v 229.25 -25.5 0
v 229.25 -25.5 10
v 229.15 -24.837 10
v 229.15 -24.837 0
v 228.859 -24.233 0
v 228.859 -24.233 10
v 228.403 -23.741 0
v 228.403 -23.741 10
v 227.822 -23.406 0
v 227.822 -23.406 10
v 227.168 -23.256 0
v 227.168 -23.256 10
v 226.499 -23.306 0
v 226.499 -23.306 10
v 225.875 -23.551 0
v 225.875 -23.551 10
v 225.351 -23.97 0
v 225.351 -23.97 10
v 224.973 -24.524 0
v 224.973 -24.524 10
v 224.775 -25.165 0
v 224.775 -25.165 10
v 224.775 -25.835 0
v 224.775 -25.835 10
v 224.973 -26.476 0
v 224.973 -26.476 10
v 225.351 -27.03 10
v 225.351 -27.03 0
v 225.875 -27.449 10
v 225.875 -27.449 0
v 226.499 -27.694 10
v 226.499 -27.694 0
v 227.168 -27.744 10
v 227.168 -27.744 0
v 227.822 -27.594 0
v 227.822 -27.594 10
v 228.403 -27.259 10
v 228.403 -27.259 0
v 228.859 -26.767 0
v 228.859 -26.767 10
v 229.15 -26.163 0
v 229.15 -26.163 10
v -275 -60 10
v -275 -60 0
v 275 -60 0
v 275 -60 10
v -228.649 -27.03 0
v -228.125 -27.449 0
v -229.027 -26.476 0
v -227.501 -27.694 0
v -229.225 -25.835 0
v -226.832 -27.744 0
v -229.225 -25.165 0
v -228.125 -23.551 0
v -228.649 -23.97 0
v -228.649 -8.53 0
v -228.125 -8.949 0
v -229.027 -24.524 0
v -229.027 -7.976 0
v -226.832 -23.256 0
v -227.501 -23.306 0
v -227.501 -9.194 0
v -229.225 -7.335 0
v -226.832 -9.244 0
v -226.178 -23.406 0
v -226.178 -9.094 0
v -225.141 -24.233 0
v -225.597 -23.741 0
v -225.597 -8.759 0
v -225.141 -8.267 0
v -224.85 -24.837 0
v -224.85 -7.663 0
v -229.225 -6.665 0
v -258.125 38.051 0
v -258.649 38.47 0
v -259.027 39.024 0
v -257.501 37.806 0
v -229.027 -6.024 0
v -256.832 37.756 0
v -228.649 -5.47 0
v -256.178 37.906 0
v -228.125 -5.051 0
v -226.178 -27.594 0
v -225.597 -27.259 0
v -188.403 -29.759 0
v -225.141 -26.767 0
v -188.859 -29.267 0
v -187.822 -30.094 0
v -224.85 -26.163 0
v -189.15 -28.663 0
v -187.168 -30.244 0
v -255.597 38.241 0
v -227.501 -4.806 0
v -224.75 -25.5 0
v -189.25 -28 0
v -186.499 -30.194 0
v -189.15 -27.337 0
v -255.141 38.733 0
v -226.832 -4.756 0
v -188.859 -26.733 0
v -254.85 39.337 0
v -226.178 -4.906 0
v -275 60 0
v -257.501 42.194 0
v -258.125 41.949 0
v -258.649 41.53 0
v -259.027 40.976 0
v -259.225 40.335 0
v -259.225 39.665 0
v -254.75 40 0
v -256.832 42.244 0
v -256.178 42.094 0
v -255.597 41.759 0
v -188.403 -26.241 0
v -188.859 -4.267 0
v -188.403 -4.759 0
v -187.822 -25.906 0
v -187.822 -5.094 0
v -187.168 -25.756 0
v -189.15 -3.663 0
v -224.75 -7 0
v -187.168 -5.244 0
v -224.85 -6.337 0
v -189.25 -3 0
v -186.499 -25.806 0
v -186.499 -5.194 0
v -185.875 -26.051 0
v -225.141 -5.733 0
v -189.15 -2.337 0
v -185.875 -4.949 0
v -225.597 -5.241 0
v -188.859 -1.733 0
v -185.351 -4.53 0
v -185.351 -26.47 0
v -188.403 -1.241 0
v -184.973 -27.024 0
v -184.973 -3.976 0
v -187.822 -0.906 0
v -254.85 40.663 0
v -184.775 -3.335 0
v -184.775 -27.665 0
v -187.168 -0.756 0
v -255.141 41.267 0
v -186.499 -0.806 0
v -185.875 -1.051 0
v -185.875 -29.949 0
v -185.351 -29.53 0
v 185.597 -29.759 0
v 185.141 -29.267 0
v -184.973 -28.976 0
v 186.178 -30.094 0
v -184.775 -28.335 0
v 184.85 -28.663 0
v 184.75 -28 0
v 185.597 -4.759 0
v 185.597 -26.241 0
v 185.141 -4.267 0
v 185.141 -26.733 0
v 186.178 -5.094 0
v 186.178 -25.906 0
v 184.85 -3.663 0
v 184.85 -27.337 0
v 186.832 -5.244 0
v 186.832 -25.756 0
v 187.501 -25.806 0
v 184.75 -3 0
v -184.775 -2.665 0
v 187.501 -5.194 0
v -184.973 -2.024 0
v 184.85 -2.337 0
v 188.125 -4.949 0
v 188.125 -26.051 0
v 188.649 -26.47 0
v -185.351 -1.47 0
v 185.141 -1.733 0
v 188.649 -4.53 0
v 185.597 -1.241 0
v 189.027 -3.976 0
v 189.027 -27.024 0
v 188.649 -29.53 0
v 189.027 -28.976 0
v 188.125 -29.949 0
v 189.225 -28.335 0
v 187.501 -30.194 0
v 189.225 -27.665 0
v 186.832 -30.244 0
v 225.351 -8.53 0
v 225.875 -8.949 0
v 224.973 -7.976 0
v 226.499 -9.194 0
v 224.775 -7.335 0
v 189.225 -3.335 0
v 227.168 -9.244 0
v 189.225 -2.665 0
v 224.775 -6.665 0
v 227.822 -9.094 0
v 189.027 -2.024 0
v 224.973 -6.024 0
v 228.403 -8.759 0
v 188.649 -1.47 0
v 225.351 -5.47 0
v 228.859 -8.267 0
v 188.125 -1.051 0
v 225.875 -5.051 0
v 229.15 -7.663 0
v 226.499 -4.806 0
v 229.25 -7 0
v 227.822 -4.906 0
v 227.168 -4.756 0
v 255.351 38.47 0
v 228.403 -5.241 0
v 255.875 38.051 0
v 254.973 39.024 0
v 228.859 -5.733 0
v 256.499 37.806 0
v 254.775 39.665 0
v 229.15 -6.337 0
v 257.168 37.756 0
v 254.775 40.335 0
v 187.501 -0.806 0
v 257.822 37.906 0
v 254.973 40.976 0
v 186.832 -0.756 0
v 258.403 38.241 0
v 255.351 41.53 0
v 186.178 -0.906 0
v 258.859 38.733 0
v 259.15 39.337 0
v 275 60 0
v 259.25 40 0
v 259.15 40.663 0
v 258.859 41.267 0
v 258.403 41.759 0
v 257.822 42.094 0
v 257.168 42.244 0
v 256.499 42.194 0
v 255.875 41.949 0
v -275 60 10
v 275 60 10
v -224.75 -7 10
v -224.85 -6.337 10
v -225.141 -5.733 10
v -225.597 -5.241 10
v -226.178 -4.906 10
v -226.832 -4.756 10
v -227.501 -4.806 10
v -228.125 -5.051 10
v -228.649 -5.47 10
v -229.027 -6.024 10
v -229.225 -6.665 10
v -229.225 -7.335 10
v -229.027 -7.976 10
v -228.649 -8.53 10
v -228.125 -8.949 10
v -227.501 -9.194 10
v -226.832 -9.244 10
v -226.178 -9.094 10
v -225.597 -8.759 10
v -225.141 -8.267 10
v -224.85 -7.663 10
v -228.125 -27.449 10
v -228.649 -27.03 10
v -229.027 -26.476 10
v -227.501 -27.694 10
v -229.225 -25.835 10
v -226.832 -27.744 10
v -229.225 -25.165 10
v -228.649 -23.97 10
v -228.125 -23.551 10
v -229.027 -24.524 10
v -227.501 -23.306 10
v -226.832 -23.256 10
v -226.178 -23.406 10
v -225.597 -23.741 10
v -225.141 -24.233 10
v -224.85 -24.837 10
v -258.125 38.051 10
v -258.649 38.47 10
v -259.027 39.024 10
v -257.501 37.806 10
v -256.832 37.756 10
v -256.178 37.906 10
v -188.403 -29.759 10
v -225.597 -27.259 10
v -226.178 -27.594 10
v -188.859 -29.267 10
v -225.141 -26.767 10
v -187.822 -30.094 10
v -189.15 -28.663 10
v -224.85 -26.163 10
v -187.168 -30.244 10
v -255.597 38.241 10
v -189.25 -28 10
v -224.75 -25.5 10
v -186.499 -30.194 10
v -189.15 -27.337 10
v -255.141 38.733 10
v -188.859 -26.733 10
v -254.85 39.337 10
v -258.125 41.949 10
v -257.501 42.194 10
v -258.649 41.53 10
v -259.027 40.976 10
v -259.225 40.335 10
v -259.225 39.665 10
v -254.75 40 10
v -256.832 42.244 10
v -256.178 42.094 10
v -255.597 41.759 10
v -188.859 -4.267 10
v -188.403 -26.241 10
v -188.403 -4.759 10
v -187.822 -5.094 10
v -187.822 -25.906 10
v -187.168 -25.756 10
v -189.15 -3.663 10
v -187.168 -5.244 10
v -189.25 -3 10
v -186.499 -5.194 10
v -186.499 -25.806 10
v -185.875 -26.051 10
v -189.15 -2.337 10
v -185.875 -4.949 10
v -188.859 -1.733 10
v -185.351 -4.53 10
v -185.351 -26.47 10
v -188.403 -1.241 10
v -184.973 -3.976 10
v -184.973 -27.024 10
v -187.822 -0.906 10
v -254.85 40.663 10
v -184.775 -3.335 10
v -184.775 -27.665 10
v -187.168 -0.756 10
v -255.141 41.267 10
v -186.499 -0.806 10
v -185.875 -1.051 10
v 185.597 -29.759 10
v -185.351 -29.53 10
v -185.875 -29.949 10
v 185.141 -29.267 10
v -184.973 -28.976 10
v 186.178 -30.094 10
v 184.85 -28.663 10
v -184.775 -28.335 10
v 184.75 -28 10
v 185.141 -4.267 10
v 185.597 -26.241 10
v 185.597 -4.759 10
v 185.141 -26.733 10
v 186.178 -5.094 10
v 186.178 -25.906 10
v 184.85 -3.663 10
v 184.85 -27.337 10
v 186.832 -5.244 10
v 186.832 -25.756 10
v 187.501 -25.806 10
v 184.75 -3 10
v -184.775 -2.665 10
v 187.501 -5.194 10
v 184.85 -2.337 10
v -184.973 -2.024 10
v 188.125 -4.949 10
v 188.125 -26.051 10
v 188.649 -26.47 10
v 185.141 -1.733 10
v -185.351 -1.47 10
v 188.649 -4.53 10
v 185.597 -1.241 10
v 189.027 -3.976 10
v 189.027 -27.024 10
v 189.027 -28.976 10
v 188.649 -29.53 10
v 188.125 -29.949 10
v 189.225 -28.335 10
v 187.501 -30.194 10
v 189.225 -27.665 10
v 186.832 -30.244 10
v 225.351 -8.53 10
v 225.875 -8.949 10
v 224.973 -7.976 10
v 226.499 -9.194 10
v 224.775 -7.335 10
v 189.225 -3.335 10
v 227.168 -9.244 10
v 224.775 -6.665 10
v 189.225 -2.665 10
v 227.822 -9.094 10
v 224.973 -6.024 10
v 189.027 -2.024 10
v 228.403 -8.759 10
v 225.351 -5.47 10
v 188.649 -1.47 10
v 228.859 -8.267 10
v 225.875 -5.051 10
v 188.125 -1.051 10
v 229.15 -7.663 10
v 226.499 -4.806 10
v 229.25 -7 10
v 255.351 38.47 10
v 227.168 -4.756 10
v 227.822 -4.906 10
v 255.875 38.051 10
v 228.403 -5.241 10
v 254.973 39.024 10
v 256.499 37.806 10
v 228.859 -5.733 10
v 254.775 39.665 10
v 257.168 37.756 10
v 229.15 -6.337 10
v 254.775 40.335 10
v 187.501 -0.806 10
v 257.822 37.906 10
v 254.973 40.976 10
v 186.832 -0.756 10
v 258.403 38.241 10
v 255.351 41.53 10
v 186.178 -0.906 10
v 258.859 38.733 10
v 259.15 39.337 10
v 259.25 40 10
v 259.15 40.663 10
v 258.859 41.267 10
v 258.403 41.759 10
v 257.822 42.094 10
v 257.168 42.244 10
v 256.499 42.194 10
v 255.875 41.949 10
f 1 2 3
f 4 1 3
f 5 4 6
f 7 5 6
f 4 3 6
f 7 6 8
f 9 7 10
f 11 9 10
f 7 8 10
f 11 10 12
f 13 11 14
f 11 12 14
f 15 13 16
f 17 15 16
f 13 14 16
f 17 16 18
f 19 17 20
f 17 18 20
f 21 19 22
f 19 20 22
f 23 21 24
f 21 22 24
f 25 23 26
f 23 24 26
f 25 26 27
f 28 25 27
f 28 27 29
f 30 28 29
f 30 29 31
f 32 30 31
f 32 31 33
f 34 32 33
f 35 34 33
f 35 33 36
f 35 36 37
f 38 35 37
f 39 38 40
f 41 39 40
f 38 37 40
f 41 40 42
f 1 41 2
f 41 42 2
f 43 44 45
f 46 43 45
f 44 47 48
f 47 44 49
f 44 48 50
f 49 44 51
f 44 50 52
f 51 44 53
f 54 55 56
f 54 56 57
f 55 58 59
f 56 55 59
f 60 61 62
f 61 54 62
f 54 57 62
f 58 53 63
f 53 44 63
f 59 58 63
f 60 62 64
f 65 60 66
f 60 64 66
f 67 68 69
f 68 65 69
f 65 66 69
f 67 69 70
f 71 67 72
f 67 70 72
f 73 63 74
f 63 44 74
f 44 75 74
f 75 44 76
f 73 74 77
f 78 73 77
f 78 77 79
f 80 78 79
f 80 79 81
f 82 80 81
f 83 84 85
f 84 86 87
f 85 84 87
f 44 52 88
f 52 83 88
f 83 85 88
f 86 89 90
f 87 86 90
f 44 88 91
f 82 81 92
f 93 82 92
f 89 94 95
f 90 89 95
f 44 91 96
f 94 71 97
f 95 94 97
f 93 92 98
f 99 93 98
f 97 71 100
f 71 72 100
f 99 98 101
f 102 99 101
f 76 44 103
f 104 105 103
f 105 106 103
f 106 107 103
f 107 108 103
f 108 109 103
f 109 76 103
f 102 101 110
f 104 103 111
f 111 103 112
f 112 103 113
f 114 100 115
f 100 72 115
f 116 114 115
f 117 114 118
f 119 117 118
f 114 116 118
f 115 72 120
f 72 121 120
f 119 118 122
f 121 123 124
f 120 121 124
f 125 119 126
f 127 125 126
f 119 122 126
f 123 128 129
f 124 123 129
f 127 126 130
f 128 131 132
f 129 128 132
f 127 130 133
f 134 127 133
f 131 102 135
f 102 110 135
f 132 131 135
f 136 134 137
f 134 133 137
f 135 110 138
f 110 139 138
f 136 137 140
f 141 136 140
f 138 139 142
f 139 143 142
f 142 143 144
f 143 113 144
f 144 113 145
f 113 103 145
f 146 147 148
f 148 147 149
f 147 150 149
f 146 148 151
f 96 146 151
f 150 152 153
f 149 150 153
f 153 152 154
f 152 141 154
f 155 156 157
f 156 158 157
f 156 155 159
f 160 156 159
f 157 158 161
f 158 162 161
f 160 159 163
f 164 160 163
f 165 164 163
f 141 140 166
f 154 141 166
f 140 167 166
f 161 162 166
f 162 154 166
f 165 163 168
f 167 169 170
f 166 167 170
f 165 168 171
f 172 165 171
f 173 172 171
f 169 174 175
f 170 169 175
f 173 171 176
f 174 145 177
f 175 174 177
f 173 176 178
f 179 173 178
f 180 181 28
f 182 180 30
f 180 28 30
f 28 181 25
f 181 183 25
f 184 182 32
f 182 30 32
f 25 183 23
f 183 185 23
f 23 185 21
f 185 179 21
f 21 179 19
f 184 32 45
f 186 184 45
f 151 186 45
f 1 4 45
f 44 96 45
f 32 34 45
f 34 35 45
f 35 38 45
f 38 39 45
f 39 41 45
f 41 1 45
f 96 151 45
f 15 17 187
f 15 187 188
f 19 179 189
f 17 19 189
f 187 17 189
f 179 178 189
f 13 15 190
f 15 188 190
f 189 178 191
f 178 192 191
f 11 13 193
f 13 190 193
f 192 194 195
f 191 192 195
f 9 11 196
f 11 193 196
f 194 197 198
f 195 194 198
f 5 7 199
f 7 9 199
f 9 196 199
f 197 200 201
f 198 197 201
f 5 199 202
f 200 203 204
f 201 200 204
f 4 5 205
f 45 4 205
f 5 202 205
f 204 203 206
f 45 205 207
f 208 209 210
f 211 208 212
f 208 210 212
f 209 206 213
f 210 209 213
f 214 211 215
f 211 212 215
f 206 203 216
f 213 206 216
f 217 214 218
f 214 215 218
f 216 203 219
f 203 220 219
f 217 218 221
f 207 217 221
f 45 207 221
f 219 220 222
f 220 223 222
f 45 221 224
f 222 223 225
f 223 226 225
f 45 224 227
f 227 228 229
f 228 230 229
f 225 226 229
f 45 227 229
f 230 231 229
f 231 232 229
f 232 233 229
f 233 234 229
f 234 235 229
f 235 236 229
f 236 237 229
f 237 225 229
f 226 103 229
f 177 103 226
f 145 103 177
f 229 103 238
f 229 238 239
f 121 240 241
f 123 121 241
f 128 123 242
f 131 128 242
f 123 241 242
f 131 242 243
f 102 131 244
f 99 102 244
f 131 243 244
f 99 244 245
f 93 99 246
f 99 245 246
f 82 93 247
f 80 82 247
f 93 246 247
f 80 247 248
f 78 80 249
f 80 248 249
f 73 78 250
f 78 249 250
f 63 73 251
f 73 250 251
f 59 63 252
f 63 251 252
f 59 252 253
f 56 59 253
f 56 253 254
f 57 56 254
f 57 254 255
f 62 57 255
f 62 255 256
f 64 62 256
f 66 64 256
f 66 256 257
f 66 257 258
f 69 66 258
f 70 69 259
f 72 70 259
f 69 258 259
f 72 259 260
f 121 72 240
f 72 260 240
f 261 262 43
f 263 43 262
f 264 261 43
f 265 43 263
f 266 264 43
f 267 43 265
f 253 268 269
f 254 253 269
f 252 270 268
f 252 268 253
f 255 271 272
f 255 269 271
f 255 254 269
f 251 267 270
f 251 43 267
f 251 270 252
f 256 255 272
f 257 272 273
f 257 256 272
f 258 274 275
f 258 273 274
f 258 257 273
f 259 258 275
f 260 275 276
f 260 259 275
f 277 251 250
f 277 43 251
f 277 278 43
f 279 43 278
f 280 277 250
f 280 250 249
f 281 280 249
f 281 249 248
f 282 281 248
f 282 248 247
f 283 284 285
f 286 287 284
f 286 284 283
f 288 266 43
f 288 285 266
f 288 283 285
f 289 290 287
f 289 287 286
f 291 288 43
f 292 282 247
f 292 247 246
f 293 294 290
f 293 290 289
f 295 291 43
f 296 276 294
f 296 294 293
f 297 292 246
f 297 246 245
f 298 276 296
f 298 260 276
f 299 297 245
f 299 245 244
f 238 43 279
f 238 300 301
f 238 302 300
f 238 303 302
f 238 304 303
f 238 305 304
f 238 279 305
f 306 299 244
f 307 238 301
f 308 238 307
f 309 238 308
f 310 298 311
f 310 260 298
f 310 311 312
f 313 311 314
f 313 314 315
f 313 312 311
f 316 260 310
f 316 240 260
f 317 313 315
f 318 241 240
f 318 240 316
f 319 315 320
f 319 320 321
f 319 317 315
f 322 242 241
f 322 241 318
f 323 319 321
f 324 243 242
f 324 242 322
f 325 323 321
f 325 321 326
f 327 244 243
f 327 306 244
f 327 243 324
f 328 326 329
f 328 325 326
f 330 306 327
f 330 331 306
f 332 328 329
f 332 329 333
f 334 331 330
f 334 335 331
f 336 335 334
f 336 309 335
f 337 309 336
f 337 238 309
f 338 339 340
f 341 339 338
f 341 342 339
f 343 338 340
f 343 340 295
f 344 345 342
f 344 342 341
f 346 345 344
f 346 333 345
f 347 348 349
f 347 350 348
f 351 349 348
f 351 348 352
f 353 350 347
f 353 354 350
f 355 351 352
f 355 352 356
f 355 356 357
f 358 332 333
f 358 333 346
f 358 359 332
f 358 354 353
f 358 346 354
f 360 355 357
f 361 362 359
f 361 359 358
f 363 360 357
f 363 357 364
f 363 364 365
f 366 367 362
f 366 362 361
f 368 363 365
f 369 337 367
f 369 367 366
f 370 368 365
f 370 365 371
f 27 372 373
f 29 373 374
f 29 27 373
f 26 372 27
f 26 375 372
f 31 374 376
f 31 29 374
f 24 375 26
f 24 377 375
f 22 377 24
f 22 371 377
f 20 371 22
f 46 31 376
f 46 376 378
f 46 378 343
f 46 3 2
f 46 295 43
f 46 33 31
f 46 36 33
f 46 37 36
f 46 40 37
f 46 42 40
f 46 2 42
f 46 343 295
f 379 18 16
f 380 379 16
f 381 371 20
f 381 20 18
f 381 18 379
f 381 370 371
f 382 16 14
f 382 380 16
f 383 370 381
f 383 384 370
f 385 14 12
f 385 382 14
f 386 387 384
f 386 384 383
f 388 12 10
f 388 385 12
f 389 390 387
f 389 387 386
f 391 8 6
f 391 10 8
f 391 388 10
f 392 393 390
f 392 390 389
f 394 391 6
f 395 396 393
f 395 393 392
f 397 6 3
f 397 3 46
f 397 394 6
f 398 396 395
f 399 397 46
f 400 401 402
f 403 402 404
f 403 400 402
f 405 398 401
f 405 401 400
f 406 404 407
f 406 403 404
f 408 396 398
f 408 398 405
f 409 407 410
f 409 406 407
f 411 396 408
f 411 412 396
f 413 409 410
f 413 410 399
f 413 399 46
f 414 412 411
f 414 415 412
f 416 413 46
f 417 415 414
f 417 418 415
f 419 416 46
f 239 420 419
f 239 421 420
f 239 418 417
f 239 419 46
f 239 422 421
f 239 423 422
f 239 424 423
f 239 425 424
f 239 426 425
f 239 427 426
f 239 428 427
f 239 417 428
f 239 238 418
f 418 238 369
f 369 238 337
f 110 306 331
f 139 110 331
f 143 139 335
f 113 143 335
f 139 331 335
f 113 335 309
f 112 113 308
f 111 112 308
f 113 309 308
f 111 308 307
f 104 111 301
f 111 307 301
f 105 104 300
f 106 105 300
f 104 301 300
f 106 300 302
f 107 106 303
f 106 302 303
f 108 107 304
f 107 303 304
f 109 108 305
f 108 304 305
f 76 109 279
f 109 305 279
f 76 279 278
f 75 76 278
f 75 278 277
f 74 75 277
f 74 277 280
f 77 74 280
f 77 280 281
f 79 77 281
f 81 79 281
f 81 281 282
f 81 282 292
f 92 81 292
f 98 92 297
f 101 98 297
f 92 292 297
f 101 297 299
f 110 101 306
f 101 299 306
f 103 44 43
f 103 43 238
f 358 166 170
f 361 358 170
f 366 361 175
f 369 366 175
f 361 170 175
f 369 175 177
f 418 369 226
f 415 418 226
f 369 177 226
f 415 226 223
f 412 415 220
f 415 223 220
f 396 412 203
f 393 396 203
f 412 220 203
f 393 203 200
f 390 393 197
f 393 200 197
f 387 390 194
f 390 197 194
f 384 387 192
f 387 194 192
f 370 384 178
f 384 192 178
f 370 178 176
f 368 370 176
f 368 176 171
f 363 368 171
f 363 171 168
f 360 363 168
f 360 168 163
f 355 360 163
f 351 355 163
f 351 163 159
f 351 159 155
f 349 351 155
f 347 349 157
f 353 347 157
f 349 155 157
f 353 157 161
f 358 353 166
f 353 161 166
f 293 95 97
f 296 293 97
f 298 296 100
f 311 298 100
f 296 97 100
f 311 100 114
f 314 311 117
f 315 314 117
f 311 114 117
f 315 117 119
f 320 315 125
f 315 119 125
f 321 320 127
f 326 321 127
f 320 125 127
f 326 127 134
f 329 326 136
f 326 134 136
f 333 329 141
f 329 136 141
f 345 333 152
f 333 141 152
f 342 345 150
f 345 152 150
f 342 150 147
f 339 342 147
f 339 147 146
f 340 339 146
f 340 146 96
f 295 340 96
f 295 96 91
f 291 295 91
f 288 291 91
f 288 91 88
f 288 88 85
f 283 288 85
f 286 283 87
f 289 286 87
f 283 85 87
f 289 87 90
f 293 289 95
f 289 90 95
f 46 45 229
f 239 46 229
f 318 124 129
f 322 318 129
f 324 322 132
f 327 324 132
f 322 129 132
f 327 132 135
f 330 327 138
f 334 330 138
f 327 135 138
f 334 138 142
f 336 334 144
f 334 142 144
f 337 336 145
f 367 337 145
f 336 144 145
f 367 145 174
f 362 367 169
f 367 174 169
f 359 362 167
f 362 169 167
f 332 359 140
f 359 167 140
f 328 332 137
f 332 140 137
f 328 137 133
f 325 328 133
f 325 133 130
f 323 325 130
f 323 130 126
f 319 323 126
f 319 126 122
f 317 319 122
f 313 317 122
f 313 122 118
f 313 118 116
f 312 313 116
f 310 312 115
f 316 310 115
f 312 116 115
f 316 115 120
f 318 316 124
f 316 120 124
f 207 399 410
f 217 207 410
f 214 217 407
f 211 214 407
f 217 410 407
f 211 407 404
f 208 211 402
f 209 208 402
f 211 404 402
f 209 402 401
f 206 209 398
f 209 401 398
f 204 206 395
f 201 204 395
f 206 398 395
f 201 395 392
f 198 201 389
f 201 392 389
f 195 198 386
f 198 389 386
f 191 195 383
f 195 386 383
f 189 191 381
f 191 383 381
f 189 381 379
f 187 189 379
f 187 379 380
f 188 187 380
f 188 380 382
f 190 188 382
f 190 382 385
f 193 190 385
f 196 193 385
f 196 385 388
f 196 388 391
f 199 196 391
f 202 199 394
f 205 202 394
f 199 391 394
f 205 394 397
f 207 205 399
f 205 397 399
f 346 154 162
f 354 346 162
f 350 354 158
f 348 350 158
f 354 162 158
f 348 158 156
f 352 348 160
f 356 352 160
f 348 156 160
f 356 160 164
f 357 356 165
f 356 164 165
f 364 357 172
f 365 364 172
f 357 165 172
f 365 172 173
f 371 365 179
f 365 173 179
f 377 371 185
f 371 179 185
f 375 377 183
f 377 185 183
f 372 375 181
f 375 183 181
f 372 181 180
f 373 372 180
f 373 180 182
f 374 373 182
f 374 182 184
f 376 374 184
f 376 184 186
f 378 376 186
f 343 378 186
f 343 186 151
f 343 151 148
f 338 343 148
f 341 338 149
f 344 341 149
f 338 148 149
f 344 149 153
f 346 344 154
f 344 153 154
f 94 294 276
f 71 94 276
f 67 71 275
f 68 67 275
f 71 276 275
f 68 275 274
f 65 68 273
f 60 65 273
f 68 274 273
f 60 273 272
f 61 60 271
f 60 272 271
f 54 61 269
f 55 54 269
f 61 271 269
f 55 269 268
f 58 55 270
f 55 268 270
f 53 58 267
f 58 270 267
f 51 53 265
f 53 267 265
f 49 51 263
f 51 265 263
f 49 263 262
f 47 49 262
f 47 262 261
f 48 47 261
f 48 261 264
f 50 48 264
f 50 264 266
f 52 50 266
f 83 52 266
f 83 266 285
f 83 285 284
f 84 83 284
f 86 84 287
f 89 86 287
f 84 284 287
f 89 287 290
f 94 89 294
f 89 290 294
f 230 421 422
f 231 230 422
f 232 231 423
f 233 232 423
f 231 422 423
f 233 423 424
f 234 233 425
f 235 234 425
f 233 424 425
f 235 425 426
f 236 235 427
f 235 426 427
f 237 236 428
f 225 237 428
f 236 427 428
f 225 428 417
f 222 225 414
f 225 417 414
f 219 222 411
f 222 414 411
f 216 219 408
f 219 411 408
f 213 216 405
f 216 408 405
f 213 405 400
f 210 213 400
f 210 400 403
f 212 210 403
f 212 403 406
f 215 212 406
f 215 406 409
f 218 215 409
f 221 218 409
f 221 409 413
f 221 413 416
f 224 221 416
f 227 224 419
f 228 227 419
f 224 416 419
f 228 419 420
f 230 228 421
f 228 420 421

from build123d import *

# Parameters (mm, degrees)
SCHIZZO1_W                   = 550
SCHIZZO1_H                   = 120
ESTRUSIONE_ESTRUSIONE1_DEPTH = 10
SCHIZZO2_R                   = 2.25
TAGLIO_ESTRUSIONE1_DEPTH     = 10
SCHIZZO3_R                   = 2.25
TAGLIO_ESTRUSIONE2_DEPTH     = 10


with BuildPart() as part:
    # Schizzo1 → Estrusione-Estrusione1 (new body)
    with BuildSketch(Plane.XY):
        Rectangle(SCHIZZO1_W, SCHIZZO1_H)
    extrude(amount=ESTRUSIONE_ESTRUSIONE1_DEPTH)

    # Schizzo2 → Taglio-Estrusione1 (cut)
    with BuildSketch(Plane.XY.offset(10)):
        with Locations((-227, -7)):
            Circle(SCHIZZO2_R)
        with Locations((-227, -25.5)):
            Circle(SCHIZZO2_R)
        with Locations((227, -7)):
            Circle(SCHIZZO2_R)
        with Locations((227, -25.5)):
            Circle(SCHIZZO2_R)
        with Locations((-257, 40)):
            Circle(SCHIZZO2_R)
        with Locations((257, 40)):
            Circle(SCHIZZO2_R)
    extrude(amount=-TAGLIO_ESTRUSIONE1_DEPTH, mode=Mode.SUBTRACT)

    # Schizzo3 → Taglio-Estrusione2 (cut)
    with BuildSketch(Plane(origin=(0, 0, 0), x_dir=(-1, 0, 0), z_dir=(0, 0, -1))):
        with Locations((187, -28)):
            Circle(SCHIZZO3_R)
        with Locations((187, -3)):
            Circle(SCHIZZO3_R)
        with Locations((-187, -3)):
            Circle(SCHIZZO3_R)
        with Locations((-187, -28)):
            Circle(SCHIZZO3_R)
    extrude(amount=-TAGLIO_ESTRUSIONE2_DEPTH, mode=Mode.SUBTRACT)


solid = part.part
